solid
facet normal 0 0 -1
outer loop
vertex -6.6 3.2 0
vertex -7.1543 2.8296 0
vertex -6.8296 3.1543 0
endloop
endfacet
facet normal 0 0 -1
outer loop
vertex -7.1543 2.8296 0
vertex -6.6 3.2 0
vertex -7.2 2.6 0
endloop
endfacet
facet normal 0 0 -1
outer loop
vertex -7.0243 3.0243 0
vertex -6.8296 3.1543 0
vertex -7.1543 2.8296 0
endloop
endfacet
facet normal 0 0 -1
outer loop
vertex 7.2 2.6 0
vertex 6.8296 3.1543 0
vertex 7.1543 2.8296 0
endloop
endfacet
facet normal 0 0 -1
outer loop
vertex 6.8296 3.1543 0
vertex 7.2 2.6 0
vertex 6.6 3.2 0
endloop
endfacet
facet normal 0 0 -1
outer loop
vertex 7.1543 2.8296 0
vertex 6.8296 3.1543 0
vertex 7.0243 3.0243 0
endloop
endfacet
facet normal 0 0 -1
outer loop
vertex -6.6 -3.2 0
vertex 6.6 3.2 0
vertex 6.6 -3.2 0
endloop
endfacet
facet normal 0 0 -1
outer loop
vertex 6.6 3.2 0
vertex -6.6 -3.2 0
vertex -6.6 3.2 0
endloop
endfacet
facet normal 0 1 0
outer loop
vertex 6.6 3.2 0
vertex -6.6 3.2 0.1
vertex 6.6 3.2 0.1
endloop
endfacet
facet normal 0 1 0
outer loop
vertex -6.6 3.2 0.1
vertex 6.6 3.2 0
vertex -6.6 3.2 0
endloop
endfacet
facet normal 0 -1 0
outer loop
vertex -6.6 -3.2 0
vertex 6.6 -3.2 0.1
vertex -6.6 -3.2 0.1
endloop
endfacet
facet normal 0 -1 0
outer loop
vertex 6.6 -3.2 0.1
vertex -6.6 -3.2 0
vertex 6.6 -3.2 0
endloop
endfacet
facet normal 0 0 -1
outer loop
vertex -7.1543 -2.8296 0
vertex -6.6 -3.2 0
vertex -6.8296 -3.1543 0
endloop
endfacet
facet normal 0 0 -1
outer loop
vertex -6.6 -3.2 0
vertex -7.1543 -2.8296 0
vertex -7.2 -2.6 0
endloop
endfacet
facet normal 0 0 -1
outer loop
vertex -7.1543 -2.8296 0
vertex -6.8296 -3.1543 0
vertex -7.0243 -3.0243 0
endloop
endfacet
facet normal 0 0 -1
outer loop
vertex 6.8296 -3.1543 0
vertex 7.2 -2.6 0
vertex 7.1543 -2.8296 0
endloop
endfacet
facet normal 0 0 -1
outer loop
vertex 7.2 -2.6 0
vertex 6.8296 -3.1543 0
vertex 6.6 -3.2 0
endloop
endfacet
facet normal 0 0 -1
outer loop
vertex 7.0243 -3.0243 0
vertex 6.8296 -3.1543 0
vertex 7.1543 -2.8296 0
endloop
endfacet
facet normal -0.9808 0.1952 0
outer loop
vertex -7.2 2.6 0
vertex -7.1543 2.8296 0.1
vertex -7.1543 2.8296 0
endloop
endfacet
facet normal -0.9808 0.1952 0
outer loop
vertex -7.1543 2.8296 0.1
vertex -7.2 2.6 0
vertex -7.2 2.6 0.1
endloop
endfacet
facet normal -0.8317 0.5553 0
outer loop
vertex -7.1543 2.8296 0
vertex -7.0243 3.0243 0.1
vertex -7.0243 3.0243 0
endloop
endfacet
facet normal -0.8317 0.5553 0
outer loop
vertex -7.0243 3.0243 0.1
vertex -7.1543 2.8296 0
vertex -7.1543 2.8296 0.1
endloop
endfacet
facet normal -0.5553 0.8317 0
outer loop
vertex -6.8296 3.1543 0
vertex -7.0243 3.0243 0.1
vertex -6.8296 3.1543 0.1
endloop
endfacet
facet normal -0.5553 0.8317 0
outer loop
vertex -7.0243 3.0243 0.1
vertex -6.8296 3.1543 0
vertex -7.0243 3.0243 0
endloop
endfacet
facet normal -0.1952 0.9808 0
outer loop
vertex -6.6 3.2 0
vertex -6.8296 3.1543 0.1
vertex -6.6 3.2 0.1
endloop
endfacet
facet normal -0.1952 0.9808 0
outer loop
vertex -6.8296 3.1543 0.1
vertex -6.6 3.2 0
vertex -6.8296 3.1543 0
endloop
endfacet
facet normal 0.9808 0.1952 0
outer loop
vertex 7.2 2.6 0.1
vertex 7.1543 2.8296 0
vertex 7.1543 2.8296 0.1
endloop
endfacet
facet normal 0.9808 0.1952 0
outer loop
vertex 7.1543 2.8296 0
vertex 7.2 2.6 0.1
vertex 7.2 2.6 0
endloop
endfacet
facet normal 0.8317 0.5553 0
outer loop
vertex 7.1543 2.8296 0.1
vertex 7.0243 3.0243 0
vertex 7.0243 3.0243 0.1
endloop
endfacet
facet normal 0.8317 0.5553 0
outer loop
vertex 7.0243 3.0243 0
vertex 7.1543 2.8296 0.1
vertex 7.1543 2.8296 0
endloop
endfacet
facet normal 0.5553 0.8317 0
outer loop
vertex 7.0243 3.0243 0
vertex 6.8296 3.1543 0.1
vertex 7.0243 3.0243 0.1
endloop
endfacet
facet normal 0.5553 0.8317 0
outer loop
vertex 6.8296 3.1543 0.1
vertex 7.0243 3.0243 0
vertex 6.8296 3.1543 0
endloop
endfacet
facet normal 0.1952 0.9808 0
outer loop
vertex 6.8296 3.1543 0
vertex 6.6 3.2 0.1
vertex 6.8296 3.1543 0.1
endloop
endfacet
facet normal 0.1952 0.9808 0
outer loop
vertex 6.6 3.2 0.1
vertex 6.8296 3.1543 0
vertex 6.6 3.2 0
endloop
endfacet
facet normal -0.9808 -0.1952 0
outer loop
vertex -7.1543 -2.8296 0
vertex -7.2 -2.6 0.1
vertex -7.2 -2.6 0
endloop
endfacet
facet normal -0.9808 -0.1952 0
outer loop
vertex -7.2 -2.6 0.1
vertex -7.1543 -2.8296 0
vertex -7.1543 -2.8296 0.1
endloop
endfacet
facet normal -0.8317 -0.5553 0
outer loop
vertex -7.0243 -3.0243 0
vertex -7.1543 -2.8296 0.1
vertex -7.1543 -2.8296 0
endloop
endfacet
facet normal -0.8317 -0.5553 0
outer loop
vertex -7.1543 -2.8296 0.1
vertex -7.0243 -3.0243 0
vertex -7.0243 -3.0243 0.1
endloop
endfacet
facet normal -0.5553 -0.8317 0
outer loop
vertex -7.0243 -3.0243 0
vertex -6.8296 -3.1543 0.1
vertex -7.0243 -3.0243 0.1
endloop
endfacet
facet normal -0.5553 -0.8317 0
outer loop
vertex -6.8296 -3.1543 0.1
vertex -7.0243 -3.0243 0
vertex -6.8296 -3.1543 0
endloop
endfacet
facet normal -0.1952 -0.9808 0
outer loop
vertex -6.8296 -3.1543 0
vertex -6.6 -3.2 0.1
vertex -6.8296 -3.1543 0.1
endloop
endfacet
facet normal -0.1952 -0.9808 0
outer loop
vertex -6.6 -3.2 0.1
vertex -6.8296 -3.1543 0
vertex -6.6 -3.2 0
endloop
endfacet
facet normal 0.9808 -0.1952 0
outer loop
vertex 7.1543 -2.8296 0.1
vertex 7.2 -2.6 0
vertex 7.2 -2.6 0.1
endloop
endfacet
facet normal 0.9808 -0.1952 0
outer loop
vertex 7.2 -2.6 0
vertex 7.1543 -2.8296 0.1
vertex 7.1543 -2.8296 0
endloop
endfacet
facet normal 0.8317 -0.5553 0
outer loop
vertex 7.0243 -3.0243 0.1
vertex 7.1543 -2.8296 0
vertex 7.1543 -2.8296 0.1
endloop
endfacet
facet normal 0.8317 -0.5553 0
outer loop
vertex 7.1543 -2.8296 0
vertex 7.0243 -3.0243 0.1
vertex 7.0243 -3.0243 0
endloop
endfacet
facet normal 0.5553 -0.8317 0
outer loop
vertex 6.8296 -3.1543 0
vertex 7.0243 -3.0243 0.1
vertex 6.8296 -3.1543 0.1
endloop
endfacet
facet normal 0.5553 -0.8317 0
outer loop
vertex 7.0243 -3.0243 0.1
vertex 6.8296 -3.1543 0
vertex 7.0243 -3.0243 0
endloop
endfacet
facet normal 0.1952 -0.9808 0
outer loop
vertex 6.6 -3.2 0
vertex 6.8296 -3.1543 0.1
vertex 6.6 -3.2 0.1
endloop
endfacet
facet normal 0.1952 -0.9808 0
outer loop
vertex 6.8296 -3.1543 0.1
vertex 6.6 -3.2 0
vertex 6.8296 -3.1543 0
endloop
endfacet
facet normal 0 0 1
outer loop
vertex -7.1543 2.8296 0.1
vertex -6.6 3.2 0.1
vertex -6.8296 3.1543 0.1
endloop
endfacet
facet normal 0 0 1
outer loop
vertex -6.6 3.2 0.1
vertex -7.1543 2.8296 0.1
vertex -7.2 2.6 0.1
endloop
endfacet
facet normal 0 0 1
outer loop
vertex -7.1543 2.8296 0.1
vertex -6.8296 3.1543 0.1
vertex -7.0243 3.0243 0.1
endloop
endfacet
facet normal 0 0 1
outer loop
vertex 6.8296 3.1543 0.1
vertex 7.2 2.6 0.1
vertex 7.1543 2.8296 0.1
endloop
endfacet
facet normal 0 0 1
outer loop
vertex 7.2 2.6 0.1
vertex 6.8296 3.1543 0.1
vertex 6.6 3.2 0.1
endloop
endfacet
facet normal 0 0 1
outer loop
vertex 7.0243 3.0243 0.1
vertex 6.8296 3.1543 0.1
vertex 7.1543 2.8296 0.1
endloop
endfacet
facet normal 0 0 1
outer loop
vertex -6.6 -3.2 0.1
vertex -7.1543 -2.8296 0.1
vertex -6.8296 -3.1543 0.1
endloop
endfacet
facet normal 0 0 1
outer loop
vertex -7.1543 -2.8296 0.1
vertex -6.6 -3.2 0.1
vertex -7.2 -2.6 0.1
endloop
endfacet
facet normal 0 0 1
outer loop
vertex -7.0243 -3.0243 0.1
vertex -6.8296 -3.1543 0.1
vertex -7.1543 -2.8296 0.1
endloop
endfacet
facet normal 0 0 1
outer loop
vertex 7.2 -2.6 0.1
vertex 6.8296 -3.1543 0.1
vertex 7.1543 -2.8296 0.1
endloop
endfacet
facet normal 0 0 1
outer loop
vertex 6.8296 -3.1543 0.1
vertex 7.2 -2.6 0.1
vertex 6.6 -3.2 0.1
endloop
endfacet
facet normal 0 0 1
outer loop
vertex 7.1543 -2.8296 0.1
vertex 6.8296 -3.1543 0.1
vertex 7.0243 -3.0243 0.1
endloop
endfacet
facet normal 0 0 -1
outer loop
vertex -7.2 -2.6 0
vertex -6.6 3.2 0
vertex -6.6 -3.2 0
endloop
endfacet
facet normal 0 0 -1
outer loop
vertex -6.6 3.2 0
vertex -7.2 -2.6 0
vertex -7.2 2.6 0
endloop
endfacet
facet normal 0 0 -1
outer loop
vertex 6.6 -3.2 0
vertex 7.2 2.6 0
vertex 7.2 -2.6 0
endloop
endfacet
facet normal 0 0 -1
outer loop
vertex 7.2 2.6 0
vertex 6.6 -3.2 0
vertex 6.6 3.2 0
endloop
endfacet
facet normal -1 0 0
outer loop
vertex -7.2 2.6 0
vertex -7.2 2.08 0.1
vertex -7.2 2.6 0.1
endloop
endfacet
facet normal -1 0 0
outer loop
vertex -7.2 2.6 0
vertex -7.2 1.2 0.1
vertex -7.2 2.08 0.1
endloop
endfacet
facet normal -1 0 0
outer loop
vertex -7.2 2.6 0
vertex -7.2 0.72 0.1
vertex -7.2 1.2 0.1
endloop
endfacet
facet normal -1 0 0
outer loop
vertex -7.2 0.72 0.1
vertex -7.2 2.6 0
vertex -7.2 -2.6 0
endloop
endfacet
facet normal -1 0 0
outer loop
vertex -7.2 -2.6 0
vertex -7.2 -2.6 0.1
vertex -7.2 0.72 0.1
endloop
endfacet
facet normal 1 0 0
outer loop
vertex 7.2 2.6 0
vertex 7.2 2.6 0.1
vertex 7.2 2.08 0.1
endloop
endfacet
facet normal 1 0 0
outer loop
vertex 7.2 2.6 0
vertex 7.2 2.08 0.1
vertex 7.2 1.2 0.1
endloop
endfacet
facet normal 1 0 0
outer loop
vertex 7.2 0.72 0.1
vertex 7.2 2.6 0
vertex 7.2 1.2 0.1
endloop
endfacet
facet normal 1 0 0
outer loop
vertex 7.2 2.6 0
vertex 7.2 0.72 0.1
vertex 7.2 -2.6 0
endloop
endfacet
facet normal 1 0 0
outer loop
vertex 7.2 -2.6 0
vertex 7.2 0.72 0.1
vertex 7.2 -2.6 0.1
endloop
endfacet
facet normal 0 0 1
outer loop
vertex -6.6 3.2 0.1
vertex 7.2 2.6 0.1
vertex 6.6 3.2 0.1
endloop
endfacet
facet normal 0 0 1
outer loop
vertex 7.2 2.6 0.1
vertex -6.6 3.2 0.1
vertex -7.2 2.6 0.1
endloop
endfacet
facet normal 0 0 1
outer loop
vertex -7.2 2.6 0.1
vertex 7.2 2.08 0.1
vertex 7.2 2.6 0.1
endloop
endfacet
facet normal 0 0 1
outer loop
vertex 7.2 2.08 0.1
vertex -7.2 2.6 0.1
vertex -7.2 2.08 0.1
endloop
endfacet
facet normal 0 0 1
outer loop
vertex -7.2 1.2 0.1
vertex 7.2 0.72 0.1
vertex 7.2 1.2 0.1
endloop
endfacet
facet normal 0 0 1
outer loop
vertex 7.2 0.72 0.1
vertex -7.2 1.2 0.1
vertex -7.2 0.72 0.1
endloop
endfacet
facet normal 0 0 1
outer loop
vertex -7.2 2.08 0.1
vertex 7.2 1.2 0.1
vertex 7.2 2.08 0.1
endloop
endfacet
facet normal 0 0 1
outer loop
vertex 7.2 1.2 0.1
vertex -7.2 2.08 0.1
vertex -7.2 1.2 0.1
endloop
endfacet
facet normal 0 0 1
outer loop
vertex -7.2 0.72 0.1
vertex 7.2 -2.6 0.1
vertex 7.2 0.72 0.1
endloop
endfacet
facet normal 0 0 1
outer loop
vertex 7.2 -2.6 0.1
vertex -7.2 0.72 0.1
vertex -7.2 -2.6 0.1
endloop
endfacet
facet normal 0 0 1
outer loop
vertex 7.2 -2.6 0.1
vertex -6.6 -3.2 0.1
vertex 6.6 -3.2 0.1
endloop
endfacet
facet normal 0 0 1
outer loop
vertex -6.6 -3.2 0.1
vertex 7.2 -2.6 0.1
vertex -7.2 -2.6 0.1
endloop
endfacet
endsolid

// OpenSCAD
// file: ../p/box3u12.scad
use <../lib.scad>
function ldraw_lib__box3u12() = [
// 0 Box with 3 Parallel Faces without Any Edges
// 0 Name: box3u12.dat
// 0 Author: J.C. Tchang [tchang]
// 0 !LDRAW_ORG Primitive UPDATE 2014-02
// 0 !LICENSE Licensed under CC BY 4.0 : see CAreadme.txt
// 
// 0 BFC CERTIFY CCW
  [0,"BFC","CERTIFY"],
  [0,"BFC","CCW"],
// 
// 0 !HISTORY 2014-12-23 [PTadmin] Official Update 2014-02
// 
// 
// 4 16 -1 1 1 1 1 1 1 1 -1 -1 1 -1
  [4,16,-1,1,1,1,1,1,1,1,-1,-1,1,-1],
// 4 16 -1 1 1 -1 0 1 1 0 1 1 1 1
  [4,16,-1,1,1,-1,0,1,1,0,1,1,1,1],
// 4 16 1 1 -1 1 0 -1 -1 0 -1 -1 1 -1
  [4,16,1,1,-1,1,0,-1,-1,0,-1,-1,1,-1],
];
module ldraw_lib__box3u12(step=0, col=false, unit=2/5, alt=false, line=0.2, solid=!$preview)
    makepoly(ldraw_lib__box3u12(), step=step, col=col, unit=unit, alt=alt, line=line, solid=solid);
ldraw_lib__box3u12(line=0.2);
// file: ../p/1-4cyli.scad
use <../lib.scad>
function ldraw_lib__1_4cyli() = [
// 0 Cylinder 0.25
// 0 Name: 1-4cyli.dat
// 0 Author: James Jessiman
// 0 !LDRAW_ORG Primitive UPDATE 2012-01
// 0 !LICENSE Licensed under CC BY 4.0 : see CAreadme.txt
// 
// 0 BFC CERTIFY CCW
  [0,"BFC","CERTIFY"],
  [0,"BFC","CCW"],
// 
// 0 !HISTORY 2002-03-23 [sbliss] Added BFC statement.
// 0 !HISTORY 2002-04-25 [PTadmin] Official Update 2002-02
// 0 !HISTORY 2007-06-22 [PTadmin] Header formatted for Contributor Agreement
// 0 !HISTORY 2008-07-01 [PTadmin] Official Update 2008-01
// 0 !HISTORY 2012-02-16 [Philo] Changed to CCW
// 0 !HISTORY 2012-03-30 [PTadmin] Official Update 2012-01
// 
// 
// 4 16 1 1 0 0.9239 1 0.3827 0.9239 0 0.3827 1 0 0
  [4,16,1,1,0,0.9239,1,0.3827,0.9239,0,0.3827,1,0,0],
// 5 24 1 0 0 1 1 0 0.9239 0 0.3827 1 0 -1
  [5,24,1,0,0,1,1,0,0.9239,0,0.3827,1,0,-1],
// 4 16 0.9239 1 0.3827 0.7071 1 0.7071 0.7071 0 0.7071 0.9239 0 0.3827
  [4,16,0.9239,1,0.3827,0.7071,1,0.7071,0.7071,0,0.7071,0.9239,0,0.3827],
// 5 24 0.9239 0 0.3827 0.9239 1 0.3827 0.7071 0 0.7071 1 0 0
  [5,24,0.9239,0,0.3827,0.9239,1,0.3827,0.7071,0,0.7071,1,0,0],
// 4 16 0.7071 1 0.7071 0.3827 1 0.9239 0.3827 0 0.9239 0.7071 0 0.7071
  [4,16,0.7071,1,0.7071,0.3827,1,0.9239,0.3827,0,0.9239,0.7071,0,0.7071],
// 5 24 0.7071 0 0.7071 0.7071 1 0.7071 0.3827 0 0.9239 0.9239 0 0.3827
  [5,24,0.7071,0,0.7071,0.7071,1,0.7071,0.3827,0,0.9239,0.9239,0,0.3827],
// 4 16 0.3827 1 0.9239 0 1 1 0 0 1 0.3827 0 0.9239
  [4,16,0.3827,1,0.9239,0,1,1,0,0,1,0.3827,0,0.9239],
// 5 24 0.3827 0 0.9239 0.3827 1 0.9239 0 0 1 0.7071 0 0.7071
  [5,24,0.3827,0,0.9239,0.3827,1,0.9239,0,0,1,0.7071,0,0.7071],
// 5 24 0 0 1 0 1 1 0.3827 0 0.9239 -1 0 1
  [5,24,0,0,1,0,1,1,0.3827,0,0.9239,-1,0,1],
];
module ldraw_lib__1_4cyli(step=0, col=false, unit=2/5, alt=false, line=0.2, solid=!$preview)
    makepoly(ldraw_lib__1_4cyli(), step=step, col=col, unit=unit, alt=alt, line=line, solid=solid);
ldraw_lib__1_4cyli(line=0.2);
// file: ../p/1-4chrd.scad
use <../lib.scad>
function ldraw_lib__1_4chrd() = [
// 0 Chord 0.25
// 0 Name: 1-4chrd.dat
// 0 Author: Max Martin Richter [MMR1988]
// 0 !LDRAW_ORG Primitive UPDATE 2023-05
// 0 !LICENSE Licensed under CC BY 4.0 : see CAreadme.txt
// 
// 0 BFC CERTIFY CCW
  [0,"BFC","CERTIFY"],
  [0,"BFC","CCW"],
// 
// 0 !HISTORY 2004-04-22 [PTadmin] Official Update 2004-02
// 0 !HISTORY 2007-10-09 [PTadmin] Header formatted for Contributor Agreement
// 0 !HISTORY 2008-07-01 [PTadmin] Official Update 2008-01
// 0 !HISTORY 2012-08-02 [MMR1988] Re-creation with PrimGen2 and Rectifier
// 0 !HISTORY 2012-08-09 [PTadmin] Official Update 2012-02
// 0 !HISTORY 2023-10-27 [OrionP] Change author to MMR1988 from hafhead
// 0 !HISTORY 2023-10-31 [OrionP] Official Update 2023-05
// 
// 4 16 0.9239 0 0.3827 0.3827 0 0.9239 0 0 1 1 0 0
  [4,16,0.9239,0,0.3827,0.3827,0,0.9239,0,0,1,1,0,0],
// 3 16 0.7071 0 0.7071 0.3827 0 0.9239 0.9239 0 0.3827
  [3,16,0.7071,0,0.7071,0.3827,0,0.9239,0.9239,0,0.3827],
];
module ldraw_lib__1_4chrd(step=0, col=false, unit=2/5, alt=false, line=0.2, solid=!$preview)
    makepoly(ldraw_lib__1_4chrd(), step=step, col=col, unit=unit, alt=alt, line=line, solid=solid);
ldraw_lib__1_4chrd(line=0.2);
// main file
use <../lib.scad>
use <../p/1-4chrd.scad>
use <../p/1-4cyli.scad>
use <../p/box3u12.scad>
function ldraw_lib__6177741d() = [
// 0 Sticker  0.8 x  1.8 with Yellow Stripes on Transparent Background
// 0 Name: 6177741d.dat
// 0 Author: Massimo Maso [Sirio]
// 0 !LDRAW_ORG Part UPDATE 2025-05
// 0 !LICENSE Licensed under CC BY 4.0 : see CAreadme.txt
// 
// 0 BFC CERTIFY CCW
  [0,"BFC","CERTIFY"],
  [0,"BFC","CCW"],
// 
// 0 !KEYWORDS AMG, GT3, Mercedes, Set 75877, Speed Champions
// 
// 0 !HISTORY 2025-05-28 [OrionP] Official Update 2025-05
// 
// 
// 0 // Primitives
// 
// 1 16 -16.5 0 6.5 -1.5 0 0 0 -1 0 0 0 1.5 1-4chrd.dat
  [1,16,-16.5,0,6.5,-1.5,0,0,0,-1,0,0,0,1.5, ldraw_lib__1_4chrd()],
// 1 16 16.5 0 6.5 1.5 0 0 0 -1 0 0 0 1.5 1-4chrd.dat
  [1,16,16.5,0,6.5,1.5,0,0,0,-1,0,0,0,1.5, ldraw_lib__1_4chrd()],
// 1 16 0 -.25 0 16.5 0 0 0 .25 0 0 0 8 box3u12.dat
  [1,16,0,-.25,0,16.5,0,0,0,.25,0,0,0,8, ldraw_lib__box3u12()],
// 1 16 -16.5 0 -6.5 -1.5 0 0 0 -1 0 0 0 -1.5 1-4chrd.dat
  [1,16,-16.5,0,-6.5,-1.5,0,0,0,-1,0,0,0,-1.5, ldraw_lib__1_4chrd()],
// 1 16 16.5 0 -6.5 1.5 0 0 0 -1 0 0 0 -1.5 1-4chrd.dat
  [1,16,16.5,0,-6.5,1.5,0,0,0,-1,0,0,0,-1.5, ldraw_lib__1_4chrd()],
// 1 16 -16.5 0 6.5 -1.5 0 0 0 -.25 0 0 0 1.5 1-4cyli.dat
  [1,16,-16.5,0,6.5,-1.5,0,0,0,-.25,0,0,0,1.5, ldraw_lib__1_4cyli()],
// 1 16 16.5 0 6.5 1.5 0 0 0 -.25 0 0 0 1.5 1-4cyli.dat
  [1,16,16.5,0,6.5,1.5,0,0,0,-.25,0,0,0,1.5, ldraw_lib__1_4cyli()],
// 1 16 -16.5 0 -6.5 -1.5 0 0 0 -.25 0 0 0 -1.5 1-4cyli.dat
  [1,16,-16.5,0,-6.5,-1.5,0,0,0,-.25,0,0,0,-1.5, ldraw_lib__1_4cyli()],
// 1 16 16.5 0 -6.5 1.5 0 0 0 -.25 0 0 0 -1.5 1-4cyli.dat
  [1,16,16.5,0,-6.5,1.5,0,0,0,-.25,0,0,0,-1.5, ldraw_lib__1_4cyli()],
// 1 16 -16.5 -.25 6.5 -1.5 0 0 0 1 0 0 0 1.5 1-4chrd.dat
  [1,16,-16.5,-.25,6.5,-1.5,0,0,0,1,0,0,0,1.5, ldraw_lib__1_4chrd()],
// 1 16 16.5 -.25 6.5 1.5 0 0 0 1 0 0 0 1.5 1-4chrd.dat
  [1,16,16.5,-.25,6.5,1.5,0,0,0,1,0,0,0,1.5, ldraw_lib__1_4chrd()],
// 0 BFC NOCLIP
  [0,"BFC","NOCLIP"],
// 1 14 -16.5 -.25 -6.5 -1.5 0 0 0 1 0 0 0 -1.5 1-4chrd.dat
  [1,14,-16.5,-.25,-6.5,-1.5,0,0,0,1,0,0,0,-1.5, ldraw_lib__1_4chrd()],
// 1 14 16.5 -.25 -6.5 1.5 0 0 0 1 0 0 0 -1.5 1-4chrd.dat
  [1,14,16.5,-.25,-6.5,1.5,0,0,0,1,0,0,0,-1.5, ldraw_lib__1_4chrd()],
// 0 BFC CLIP
  [0,"BFC","CLIP"],
// 0 // Bottom face
// 4 16 -16.5 0 8 -16.5 0 -8 -18 0 -6.5 -18 0 6.5
  [4,16,-16.5,0,8,-16.5,0,-8,-18,0,-6.5,-18,0,6.5],
// 4 16 16.5 0 8 18 0 6.5 18 0 -6.5 16.5 0 -8
  [4,16,16.5,0,8,18,0,6.5,18,0,-6.5,16.5,0,-8],
// 0 // Lateral face
// 3 16 -18 0 6.5 -18 -.25 5.2 -18 -.25 6.5
  [3,16,-18,0,6.5,-18,-.25,5.2,-18,-.25,6.5],
// 3 16 -18 0 6.5 -18 -.25 3 -18 -.25 5.2
  [3,16,-18,0,6.5,-18,-.25,3,-18,-.25,5.2],
// 4 16 -18 0 -6.5 -18 -.25 1.8 -18 -.25 3 -18 0 6.5
  [4,16,-18,0,-6.5,-18,-.25,1.8,-18,-.25,3,-18,0,6.5],
// 3 16 -18 0 -6.5 -18 -.25 -6.5 -18 -.25 1.8
  [3,16,-18,0,-6.5,-18,-.25,-6.5,-18,-.25,1.8],
// 3 16 18 0 6.5 18 -.25 6.5 18 -.25 5.2
  [3,16,18,0,6.5,18,-.25,6.5,18,-.25,5.2],
// 3 16 18 0 6.5 18 -.25 5.2 18 -.25 3
  [3,16,18,0,6.5,18,-.25,5.2,18,-.25,3],
// 4 16 18 0 -6.5 18 0 6.5 18 -.25 3 18 -.25 1.8
  [4,16,18,0,-6.5,18,0,6.5,18,-.25,3,18,-.25,1.8],
// 3 16 18 0 -6.5 18 -.25 1.8 18 -.25 -6.5
  [3,16,18,0,-6.5,18,-.25,1.8,18,-.25,-6.5],
// 0 // Top face
// 0 // Neutral faces
// 0 // First stirpe faces
// 4 16 -18 -.25 6.5 18 -.25 6.5 16.5 -.25 8 -16.5 -.25 8
  [4,16,-18,-.25,6.5,18,-.25,6.5,16.5,-.25,8,-16.5,-.25,8],
// 4 16 -18 -.25 6.5 -18 -.25 5.2 18 -.25 5.2 18 -.25 6.5
  [4,16,-18,-.25,6.5,-18,-.25,5.2,18,-.25,5.2,18,-.25,6.5],
// 0 // Second stripe faces
// 4 16 -18 -.25 3 -18 -.25 1.8 18 -.25 1.8 18 -.25 3
  [4,16,-18,-.25,3,-18,-.25,1.8,18,-.25,1.8,18,-.25,3],
// 0 BFC NOCLIP
  [0,"BFC","NOCLIP"],
// 0 // Yellow faces
// 0 // First stirpe faces
// 4 14 -18 -.25 3 18 -.25 3 18 -.25 5.2 -18 -.25 5.2
  [4,14,-18,-.25,3,18,-.25,3,18,-.25,5.2,-18,-.25,5.2],
// 0 // Second stripe faces
// 4 14 -18 -.25 -6.5 18 -.25 -6.5 18 -.25 1.8 -18 -.25 1.8
  [4,14,-18,-.25,-6.5,18,-.25,-6.5,18,-.25,1.8,-18,-.25,1.8],
// 4 14 -18 -.25 -6.5 -16.5 -.25 -8 16.5 -.25 -8 18 -.25 -6.5
  [4,14,-18,-.25,-6.5,-16.5,-.25,-8,16.5,-.25,-8,18,-.25,-6.5],
];
module ldraw_lib__6177741d(step=0, col=false, unit=2/5, alt=false, line=0.2, solid=!$preview)
    makepoly(ldraw_lib__6177741d(), step=step, col=col, unit=unit, alt=alt, line=line, solid=solid);
ldraw_lib__6177741d(line=0.2);
